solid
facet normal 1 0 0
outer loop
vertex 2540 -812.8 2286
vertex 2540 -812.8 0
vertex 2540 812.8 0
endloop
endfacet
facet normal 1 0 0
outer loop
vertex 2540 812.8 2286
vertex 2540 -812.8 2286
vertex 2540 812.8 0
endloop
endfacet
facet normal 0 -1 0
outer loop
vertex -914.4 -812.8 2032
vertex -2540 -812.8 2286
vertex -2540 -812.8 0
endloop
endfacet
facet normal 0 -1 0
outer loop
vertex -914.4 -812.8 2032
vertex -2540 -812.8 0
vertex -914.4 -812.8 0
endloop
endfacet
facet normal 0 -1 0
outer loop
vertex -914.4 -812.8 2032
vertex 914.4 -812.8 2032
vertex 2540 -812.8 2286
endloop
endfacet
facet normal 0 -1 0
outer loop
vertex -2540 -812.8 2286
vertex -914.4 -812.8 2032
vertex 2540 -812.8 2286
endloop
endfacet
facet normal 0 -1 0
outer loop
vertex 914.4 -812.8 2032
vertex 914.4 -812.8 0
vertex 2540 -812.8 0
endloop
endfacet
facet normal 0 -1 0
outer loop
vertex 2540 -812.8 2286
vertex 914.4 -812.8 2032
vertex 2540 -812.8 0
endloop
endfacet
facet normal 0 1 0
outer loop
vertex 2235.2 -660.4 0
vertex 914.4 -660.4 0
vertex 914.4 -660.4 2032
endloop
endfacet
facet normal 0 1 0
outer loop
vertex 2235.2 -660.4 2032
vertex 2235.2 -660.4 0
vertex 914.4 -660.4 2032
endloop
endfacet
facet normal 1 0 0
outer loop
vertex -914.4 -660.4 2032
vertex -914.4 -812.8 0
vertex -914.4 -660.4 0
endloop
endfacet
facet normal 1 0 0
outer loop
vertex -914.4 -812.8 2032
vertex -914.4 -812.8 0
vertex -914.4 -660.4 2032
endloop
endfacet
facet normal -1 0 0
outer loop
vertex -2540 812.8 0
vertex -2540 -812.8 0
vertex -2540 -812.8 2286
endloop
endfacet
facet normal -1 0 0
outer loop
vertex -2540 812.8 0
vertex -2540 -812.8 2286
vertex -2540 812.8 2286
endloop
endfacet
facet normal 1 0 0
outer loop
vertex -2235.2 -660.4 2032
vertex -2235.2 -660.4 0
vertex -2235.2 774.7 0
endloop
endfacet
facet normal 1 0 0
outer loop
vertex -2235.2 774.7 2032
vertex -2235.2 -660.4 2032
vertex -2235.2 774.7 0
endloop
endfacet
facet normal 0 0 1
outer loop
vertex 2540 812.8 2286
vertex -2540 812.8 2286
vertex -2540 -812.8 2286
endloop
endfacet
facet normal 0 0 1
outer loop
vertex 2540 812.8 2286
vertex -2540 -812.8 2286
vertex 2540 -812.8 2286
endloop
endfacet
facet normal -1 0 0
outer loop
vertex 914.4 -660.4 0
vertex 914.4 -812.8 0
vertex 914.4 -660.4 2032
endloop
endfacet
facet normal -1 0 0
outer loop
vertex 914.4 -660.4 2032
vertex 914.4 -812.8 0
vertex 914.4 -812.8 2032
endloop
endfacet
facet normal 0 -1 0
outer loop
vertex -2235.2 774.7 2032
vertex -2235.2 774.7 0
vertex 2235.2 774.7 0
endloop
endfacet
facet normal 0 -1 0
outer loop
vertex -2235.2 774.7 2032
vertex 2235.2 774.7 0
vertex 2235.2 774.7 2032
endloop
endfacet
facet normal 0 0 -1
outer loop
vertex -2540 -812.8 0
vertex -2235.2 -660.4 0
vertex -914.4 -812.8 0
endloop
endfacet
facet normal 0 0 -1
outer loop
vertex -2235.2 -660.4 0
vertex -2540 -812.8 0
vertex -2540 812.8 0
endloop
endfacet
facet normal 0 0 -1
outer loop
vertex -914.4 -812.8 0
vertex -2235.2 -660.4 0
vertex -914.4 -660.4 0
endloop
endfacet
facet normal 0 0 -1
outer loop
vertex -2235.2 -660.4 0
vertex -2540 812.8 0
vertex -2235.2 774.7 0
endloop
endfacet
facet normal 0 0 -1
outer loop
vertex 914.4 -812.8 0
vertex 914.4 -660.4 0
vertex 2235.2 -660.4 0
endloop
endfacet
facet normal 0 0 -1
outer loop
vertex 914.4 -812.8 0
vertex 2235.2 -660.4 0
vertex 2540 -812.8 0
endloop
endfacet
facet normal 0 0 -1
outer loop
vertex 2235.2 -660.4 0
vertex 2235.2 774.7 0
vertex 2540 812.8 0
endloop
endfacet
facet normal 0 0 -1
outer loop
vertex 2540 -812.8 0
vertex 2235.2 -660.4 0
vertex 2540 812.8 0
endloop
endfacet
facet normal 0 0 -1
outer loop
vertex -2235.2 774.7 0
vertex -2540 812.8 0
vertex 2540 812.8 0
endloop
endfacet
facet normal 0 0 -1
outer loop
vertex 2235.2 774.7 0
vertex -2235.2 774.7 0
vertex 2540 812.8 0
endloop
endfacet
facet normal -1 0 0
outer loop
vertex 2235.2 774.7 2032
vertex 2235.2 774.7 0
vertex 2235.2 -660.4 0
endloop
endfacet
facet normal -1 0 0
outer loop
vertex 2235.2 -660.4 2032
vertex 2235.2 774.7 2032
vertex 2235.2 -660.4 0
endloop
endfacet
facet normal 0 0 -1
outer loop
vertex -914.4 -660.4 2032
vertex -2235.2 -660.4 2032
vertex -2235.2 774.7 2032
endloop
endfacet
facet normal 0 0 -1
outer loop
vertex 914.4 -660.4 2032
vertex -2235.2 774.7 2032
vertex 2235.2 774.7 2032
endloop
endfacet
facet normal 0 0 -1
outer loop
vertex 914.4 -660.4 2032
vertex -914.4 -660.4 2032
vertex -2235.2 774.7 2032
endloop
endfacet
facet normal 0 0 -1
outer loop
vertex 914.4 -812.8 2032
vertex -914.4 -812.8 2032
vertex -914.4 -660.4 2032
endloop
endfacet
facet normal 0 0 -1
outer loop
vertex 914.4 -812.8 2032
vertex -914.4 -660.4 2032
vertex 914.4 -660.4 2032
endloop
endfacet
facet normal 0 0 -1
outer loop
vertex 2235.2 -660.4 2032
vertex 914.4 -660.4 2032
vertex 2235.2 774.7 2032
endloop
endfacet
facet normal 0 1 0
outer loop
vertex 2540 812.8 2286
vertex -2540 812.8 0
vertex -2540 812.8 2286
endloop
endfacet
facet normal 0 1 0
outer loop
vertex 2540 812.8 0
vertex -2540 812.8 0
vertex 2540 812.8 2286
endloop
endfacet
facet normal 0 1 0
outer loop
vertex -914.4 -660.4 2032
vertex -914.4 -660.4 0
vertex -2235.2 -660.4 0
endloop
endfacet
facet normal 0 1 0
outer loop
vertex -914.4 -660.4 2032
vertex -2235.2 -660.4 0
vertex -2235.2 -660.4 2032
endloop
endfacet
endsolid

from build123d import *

# Parameters (mm, degrees)
F0_W     = 5080
F0_H     = 1625.6
F1_DEPTH = 2286
F2_W     = 1828.8
F2_H     = 2032
F3_DEPTH = 1587.5
F4_W     = 1435.1
F4_H     = 2032
F5_DEPTH = 1320.8
F6_W     = 1435.1
F6_H     = 2032
F7_DEPTH = 1320.8


with BuildPart() as f1:
    # F0 (on Top) → F1 (new body)
    with BuildSketch(Plane.XY):
        Rectangle(F0_W, F0_H)
    extrude(amount=F1_DEPTH)

    # F2 (on face) → F3 (cut)
    with BuildSketch(Plane.XZ.offset(812.8)):
        with Locations((0, 1016)):
            Rectangle(F2_W, F2_H)
    extrude(amount=-F3_DEPTH, mode=Mode.SUBTRACT)

    # F4 (on face) → F5 (cut)
    with BuildSketch(Plane(origin=(914.4, 0, 0), x_dir=(0, -1, 0), z_dir=(-1, 0, 0))):
        with Locations((-57.15, 1016)):
            Rectangle(F4_W, F4_H)
    extrude(amount=-F5_DEPTH, mode=Mode.SUBTRACT)

    # F6 (on face) → F7 (cut)
    with BuildSketch(Plane.YZ.offset(-914.4)):
        with Locations((57.15, 1016)):
            Rectangle(F6_W, F6_H)
    extrude(amount=-F7_DEPTH, mode=Mode.SUBTRACT)


solid = f1.part
